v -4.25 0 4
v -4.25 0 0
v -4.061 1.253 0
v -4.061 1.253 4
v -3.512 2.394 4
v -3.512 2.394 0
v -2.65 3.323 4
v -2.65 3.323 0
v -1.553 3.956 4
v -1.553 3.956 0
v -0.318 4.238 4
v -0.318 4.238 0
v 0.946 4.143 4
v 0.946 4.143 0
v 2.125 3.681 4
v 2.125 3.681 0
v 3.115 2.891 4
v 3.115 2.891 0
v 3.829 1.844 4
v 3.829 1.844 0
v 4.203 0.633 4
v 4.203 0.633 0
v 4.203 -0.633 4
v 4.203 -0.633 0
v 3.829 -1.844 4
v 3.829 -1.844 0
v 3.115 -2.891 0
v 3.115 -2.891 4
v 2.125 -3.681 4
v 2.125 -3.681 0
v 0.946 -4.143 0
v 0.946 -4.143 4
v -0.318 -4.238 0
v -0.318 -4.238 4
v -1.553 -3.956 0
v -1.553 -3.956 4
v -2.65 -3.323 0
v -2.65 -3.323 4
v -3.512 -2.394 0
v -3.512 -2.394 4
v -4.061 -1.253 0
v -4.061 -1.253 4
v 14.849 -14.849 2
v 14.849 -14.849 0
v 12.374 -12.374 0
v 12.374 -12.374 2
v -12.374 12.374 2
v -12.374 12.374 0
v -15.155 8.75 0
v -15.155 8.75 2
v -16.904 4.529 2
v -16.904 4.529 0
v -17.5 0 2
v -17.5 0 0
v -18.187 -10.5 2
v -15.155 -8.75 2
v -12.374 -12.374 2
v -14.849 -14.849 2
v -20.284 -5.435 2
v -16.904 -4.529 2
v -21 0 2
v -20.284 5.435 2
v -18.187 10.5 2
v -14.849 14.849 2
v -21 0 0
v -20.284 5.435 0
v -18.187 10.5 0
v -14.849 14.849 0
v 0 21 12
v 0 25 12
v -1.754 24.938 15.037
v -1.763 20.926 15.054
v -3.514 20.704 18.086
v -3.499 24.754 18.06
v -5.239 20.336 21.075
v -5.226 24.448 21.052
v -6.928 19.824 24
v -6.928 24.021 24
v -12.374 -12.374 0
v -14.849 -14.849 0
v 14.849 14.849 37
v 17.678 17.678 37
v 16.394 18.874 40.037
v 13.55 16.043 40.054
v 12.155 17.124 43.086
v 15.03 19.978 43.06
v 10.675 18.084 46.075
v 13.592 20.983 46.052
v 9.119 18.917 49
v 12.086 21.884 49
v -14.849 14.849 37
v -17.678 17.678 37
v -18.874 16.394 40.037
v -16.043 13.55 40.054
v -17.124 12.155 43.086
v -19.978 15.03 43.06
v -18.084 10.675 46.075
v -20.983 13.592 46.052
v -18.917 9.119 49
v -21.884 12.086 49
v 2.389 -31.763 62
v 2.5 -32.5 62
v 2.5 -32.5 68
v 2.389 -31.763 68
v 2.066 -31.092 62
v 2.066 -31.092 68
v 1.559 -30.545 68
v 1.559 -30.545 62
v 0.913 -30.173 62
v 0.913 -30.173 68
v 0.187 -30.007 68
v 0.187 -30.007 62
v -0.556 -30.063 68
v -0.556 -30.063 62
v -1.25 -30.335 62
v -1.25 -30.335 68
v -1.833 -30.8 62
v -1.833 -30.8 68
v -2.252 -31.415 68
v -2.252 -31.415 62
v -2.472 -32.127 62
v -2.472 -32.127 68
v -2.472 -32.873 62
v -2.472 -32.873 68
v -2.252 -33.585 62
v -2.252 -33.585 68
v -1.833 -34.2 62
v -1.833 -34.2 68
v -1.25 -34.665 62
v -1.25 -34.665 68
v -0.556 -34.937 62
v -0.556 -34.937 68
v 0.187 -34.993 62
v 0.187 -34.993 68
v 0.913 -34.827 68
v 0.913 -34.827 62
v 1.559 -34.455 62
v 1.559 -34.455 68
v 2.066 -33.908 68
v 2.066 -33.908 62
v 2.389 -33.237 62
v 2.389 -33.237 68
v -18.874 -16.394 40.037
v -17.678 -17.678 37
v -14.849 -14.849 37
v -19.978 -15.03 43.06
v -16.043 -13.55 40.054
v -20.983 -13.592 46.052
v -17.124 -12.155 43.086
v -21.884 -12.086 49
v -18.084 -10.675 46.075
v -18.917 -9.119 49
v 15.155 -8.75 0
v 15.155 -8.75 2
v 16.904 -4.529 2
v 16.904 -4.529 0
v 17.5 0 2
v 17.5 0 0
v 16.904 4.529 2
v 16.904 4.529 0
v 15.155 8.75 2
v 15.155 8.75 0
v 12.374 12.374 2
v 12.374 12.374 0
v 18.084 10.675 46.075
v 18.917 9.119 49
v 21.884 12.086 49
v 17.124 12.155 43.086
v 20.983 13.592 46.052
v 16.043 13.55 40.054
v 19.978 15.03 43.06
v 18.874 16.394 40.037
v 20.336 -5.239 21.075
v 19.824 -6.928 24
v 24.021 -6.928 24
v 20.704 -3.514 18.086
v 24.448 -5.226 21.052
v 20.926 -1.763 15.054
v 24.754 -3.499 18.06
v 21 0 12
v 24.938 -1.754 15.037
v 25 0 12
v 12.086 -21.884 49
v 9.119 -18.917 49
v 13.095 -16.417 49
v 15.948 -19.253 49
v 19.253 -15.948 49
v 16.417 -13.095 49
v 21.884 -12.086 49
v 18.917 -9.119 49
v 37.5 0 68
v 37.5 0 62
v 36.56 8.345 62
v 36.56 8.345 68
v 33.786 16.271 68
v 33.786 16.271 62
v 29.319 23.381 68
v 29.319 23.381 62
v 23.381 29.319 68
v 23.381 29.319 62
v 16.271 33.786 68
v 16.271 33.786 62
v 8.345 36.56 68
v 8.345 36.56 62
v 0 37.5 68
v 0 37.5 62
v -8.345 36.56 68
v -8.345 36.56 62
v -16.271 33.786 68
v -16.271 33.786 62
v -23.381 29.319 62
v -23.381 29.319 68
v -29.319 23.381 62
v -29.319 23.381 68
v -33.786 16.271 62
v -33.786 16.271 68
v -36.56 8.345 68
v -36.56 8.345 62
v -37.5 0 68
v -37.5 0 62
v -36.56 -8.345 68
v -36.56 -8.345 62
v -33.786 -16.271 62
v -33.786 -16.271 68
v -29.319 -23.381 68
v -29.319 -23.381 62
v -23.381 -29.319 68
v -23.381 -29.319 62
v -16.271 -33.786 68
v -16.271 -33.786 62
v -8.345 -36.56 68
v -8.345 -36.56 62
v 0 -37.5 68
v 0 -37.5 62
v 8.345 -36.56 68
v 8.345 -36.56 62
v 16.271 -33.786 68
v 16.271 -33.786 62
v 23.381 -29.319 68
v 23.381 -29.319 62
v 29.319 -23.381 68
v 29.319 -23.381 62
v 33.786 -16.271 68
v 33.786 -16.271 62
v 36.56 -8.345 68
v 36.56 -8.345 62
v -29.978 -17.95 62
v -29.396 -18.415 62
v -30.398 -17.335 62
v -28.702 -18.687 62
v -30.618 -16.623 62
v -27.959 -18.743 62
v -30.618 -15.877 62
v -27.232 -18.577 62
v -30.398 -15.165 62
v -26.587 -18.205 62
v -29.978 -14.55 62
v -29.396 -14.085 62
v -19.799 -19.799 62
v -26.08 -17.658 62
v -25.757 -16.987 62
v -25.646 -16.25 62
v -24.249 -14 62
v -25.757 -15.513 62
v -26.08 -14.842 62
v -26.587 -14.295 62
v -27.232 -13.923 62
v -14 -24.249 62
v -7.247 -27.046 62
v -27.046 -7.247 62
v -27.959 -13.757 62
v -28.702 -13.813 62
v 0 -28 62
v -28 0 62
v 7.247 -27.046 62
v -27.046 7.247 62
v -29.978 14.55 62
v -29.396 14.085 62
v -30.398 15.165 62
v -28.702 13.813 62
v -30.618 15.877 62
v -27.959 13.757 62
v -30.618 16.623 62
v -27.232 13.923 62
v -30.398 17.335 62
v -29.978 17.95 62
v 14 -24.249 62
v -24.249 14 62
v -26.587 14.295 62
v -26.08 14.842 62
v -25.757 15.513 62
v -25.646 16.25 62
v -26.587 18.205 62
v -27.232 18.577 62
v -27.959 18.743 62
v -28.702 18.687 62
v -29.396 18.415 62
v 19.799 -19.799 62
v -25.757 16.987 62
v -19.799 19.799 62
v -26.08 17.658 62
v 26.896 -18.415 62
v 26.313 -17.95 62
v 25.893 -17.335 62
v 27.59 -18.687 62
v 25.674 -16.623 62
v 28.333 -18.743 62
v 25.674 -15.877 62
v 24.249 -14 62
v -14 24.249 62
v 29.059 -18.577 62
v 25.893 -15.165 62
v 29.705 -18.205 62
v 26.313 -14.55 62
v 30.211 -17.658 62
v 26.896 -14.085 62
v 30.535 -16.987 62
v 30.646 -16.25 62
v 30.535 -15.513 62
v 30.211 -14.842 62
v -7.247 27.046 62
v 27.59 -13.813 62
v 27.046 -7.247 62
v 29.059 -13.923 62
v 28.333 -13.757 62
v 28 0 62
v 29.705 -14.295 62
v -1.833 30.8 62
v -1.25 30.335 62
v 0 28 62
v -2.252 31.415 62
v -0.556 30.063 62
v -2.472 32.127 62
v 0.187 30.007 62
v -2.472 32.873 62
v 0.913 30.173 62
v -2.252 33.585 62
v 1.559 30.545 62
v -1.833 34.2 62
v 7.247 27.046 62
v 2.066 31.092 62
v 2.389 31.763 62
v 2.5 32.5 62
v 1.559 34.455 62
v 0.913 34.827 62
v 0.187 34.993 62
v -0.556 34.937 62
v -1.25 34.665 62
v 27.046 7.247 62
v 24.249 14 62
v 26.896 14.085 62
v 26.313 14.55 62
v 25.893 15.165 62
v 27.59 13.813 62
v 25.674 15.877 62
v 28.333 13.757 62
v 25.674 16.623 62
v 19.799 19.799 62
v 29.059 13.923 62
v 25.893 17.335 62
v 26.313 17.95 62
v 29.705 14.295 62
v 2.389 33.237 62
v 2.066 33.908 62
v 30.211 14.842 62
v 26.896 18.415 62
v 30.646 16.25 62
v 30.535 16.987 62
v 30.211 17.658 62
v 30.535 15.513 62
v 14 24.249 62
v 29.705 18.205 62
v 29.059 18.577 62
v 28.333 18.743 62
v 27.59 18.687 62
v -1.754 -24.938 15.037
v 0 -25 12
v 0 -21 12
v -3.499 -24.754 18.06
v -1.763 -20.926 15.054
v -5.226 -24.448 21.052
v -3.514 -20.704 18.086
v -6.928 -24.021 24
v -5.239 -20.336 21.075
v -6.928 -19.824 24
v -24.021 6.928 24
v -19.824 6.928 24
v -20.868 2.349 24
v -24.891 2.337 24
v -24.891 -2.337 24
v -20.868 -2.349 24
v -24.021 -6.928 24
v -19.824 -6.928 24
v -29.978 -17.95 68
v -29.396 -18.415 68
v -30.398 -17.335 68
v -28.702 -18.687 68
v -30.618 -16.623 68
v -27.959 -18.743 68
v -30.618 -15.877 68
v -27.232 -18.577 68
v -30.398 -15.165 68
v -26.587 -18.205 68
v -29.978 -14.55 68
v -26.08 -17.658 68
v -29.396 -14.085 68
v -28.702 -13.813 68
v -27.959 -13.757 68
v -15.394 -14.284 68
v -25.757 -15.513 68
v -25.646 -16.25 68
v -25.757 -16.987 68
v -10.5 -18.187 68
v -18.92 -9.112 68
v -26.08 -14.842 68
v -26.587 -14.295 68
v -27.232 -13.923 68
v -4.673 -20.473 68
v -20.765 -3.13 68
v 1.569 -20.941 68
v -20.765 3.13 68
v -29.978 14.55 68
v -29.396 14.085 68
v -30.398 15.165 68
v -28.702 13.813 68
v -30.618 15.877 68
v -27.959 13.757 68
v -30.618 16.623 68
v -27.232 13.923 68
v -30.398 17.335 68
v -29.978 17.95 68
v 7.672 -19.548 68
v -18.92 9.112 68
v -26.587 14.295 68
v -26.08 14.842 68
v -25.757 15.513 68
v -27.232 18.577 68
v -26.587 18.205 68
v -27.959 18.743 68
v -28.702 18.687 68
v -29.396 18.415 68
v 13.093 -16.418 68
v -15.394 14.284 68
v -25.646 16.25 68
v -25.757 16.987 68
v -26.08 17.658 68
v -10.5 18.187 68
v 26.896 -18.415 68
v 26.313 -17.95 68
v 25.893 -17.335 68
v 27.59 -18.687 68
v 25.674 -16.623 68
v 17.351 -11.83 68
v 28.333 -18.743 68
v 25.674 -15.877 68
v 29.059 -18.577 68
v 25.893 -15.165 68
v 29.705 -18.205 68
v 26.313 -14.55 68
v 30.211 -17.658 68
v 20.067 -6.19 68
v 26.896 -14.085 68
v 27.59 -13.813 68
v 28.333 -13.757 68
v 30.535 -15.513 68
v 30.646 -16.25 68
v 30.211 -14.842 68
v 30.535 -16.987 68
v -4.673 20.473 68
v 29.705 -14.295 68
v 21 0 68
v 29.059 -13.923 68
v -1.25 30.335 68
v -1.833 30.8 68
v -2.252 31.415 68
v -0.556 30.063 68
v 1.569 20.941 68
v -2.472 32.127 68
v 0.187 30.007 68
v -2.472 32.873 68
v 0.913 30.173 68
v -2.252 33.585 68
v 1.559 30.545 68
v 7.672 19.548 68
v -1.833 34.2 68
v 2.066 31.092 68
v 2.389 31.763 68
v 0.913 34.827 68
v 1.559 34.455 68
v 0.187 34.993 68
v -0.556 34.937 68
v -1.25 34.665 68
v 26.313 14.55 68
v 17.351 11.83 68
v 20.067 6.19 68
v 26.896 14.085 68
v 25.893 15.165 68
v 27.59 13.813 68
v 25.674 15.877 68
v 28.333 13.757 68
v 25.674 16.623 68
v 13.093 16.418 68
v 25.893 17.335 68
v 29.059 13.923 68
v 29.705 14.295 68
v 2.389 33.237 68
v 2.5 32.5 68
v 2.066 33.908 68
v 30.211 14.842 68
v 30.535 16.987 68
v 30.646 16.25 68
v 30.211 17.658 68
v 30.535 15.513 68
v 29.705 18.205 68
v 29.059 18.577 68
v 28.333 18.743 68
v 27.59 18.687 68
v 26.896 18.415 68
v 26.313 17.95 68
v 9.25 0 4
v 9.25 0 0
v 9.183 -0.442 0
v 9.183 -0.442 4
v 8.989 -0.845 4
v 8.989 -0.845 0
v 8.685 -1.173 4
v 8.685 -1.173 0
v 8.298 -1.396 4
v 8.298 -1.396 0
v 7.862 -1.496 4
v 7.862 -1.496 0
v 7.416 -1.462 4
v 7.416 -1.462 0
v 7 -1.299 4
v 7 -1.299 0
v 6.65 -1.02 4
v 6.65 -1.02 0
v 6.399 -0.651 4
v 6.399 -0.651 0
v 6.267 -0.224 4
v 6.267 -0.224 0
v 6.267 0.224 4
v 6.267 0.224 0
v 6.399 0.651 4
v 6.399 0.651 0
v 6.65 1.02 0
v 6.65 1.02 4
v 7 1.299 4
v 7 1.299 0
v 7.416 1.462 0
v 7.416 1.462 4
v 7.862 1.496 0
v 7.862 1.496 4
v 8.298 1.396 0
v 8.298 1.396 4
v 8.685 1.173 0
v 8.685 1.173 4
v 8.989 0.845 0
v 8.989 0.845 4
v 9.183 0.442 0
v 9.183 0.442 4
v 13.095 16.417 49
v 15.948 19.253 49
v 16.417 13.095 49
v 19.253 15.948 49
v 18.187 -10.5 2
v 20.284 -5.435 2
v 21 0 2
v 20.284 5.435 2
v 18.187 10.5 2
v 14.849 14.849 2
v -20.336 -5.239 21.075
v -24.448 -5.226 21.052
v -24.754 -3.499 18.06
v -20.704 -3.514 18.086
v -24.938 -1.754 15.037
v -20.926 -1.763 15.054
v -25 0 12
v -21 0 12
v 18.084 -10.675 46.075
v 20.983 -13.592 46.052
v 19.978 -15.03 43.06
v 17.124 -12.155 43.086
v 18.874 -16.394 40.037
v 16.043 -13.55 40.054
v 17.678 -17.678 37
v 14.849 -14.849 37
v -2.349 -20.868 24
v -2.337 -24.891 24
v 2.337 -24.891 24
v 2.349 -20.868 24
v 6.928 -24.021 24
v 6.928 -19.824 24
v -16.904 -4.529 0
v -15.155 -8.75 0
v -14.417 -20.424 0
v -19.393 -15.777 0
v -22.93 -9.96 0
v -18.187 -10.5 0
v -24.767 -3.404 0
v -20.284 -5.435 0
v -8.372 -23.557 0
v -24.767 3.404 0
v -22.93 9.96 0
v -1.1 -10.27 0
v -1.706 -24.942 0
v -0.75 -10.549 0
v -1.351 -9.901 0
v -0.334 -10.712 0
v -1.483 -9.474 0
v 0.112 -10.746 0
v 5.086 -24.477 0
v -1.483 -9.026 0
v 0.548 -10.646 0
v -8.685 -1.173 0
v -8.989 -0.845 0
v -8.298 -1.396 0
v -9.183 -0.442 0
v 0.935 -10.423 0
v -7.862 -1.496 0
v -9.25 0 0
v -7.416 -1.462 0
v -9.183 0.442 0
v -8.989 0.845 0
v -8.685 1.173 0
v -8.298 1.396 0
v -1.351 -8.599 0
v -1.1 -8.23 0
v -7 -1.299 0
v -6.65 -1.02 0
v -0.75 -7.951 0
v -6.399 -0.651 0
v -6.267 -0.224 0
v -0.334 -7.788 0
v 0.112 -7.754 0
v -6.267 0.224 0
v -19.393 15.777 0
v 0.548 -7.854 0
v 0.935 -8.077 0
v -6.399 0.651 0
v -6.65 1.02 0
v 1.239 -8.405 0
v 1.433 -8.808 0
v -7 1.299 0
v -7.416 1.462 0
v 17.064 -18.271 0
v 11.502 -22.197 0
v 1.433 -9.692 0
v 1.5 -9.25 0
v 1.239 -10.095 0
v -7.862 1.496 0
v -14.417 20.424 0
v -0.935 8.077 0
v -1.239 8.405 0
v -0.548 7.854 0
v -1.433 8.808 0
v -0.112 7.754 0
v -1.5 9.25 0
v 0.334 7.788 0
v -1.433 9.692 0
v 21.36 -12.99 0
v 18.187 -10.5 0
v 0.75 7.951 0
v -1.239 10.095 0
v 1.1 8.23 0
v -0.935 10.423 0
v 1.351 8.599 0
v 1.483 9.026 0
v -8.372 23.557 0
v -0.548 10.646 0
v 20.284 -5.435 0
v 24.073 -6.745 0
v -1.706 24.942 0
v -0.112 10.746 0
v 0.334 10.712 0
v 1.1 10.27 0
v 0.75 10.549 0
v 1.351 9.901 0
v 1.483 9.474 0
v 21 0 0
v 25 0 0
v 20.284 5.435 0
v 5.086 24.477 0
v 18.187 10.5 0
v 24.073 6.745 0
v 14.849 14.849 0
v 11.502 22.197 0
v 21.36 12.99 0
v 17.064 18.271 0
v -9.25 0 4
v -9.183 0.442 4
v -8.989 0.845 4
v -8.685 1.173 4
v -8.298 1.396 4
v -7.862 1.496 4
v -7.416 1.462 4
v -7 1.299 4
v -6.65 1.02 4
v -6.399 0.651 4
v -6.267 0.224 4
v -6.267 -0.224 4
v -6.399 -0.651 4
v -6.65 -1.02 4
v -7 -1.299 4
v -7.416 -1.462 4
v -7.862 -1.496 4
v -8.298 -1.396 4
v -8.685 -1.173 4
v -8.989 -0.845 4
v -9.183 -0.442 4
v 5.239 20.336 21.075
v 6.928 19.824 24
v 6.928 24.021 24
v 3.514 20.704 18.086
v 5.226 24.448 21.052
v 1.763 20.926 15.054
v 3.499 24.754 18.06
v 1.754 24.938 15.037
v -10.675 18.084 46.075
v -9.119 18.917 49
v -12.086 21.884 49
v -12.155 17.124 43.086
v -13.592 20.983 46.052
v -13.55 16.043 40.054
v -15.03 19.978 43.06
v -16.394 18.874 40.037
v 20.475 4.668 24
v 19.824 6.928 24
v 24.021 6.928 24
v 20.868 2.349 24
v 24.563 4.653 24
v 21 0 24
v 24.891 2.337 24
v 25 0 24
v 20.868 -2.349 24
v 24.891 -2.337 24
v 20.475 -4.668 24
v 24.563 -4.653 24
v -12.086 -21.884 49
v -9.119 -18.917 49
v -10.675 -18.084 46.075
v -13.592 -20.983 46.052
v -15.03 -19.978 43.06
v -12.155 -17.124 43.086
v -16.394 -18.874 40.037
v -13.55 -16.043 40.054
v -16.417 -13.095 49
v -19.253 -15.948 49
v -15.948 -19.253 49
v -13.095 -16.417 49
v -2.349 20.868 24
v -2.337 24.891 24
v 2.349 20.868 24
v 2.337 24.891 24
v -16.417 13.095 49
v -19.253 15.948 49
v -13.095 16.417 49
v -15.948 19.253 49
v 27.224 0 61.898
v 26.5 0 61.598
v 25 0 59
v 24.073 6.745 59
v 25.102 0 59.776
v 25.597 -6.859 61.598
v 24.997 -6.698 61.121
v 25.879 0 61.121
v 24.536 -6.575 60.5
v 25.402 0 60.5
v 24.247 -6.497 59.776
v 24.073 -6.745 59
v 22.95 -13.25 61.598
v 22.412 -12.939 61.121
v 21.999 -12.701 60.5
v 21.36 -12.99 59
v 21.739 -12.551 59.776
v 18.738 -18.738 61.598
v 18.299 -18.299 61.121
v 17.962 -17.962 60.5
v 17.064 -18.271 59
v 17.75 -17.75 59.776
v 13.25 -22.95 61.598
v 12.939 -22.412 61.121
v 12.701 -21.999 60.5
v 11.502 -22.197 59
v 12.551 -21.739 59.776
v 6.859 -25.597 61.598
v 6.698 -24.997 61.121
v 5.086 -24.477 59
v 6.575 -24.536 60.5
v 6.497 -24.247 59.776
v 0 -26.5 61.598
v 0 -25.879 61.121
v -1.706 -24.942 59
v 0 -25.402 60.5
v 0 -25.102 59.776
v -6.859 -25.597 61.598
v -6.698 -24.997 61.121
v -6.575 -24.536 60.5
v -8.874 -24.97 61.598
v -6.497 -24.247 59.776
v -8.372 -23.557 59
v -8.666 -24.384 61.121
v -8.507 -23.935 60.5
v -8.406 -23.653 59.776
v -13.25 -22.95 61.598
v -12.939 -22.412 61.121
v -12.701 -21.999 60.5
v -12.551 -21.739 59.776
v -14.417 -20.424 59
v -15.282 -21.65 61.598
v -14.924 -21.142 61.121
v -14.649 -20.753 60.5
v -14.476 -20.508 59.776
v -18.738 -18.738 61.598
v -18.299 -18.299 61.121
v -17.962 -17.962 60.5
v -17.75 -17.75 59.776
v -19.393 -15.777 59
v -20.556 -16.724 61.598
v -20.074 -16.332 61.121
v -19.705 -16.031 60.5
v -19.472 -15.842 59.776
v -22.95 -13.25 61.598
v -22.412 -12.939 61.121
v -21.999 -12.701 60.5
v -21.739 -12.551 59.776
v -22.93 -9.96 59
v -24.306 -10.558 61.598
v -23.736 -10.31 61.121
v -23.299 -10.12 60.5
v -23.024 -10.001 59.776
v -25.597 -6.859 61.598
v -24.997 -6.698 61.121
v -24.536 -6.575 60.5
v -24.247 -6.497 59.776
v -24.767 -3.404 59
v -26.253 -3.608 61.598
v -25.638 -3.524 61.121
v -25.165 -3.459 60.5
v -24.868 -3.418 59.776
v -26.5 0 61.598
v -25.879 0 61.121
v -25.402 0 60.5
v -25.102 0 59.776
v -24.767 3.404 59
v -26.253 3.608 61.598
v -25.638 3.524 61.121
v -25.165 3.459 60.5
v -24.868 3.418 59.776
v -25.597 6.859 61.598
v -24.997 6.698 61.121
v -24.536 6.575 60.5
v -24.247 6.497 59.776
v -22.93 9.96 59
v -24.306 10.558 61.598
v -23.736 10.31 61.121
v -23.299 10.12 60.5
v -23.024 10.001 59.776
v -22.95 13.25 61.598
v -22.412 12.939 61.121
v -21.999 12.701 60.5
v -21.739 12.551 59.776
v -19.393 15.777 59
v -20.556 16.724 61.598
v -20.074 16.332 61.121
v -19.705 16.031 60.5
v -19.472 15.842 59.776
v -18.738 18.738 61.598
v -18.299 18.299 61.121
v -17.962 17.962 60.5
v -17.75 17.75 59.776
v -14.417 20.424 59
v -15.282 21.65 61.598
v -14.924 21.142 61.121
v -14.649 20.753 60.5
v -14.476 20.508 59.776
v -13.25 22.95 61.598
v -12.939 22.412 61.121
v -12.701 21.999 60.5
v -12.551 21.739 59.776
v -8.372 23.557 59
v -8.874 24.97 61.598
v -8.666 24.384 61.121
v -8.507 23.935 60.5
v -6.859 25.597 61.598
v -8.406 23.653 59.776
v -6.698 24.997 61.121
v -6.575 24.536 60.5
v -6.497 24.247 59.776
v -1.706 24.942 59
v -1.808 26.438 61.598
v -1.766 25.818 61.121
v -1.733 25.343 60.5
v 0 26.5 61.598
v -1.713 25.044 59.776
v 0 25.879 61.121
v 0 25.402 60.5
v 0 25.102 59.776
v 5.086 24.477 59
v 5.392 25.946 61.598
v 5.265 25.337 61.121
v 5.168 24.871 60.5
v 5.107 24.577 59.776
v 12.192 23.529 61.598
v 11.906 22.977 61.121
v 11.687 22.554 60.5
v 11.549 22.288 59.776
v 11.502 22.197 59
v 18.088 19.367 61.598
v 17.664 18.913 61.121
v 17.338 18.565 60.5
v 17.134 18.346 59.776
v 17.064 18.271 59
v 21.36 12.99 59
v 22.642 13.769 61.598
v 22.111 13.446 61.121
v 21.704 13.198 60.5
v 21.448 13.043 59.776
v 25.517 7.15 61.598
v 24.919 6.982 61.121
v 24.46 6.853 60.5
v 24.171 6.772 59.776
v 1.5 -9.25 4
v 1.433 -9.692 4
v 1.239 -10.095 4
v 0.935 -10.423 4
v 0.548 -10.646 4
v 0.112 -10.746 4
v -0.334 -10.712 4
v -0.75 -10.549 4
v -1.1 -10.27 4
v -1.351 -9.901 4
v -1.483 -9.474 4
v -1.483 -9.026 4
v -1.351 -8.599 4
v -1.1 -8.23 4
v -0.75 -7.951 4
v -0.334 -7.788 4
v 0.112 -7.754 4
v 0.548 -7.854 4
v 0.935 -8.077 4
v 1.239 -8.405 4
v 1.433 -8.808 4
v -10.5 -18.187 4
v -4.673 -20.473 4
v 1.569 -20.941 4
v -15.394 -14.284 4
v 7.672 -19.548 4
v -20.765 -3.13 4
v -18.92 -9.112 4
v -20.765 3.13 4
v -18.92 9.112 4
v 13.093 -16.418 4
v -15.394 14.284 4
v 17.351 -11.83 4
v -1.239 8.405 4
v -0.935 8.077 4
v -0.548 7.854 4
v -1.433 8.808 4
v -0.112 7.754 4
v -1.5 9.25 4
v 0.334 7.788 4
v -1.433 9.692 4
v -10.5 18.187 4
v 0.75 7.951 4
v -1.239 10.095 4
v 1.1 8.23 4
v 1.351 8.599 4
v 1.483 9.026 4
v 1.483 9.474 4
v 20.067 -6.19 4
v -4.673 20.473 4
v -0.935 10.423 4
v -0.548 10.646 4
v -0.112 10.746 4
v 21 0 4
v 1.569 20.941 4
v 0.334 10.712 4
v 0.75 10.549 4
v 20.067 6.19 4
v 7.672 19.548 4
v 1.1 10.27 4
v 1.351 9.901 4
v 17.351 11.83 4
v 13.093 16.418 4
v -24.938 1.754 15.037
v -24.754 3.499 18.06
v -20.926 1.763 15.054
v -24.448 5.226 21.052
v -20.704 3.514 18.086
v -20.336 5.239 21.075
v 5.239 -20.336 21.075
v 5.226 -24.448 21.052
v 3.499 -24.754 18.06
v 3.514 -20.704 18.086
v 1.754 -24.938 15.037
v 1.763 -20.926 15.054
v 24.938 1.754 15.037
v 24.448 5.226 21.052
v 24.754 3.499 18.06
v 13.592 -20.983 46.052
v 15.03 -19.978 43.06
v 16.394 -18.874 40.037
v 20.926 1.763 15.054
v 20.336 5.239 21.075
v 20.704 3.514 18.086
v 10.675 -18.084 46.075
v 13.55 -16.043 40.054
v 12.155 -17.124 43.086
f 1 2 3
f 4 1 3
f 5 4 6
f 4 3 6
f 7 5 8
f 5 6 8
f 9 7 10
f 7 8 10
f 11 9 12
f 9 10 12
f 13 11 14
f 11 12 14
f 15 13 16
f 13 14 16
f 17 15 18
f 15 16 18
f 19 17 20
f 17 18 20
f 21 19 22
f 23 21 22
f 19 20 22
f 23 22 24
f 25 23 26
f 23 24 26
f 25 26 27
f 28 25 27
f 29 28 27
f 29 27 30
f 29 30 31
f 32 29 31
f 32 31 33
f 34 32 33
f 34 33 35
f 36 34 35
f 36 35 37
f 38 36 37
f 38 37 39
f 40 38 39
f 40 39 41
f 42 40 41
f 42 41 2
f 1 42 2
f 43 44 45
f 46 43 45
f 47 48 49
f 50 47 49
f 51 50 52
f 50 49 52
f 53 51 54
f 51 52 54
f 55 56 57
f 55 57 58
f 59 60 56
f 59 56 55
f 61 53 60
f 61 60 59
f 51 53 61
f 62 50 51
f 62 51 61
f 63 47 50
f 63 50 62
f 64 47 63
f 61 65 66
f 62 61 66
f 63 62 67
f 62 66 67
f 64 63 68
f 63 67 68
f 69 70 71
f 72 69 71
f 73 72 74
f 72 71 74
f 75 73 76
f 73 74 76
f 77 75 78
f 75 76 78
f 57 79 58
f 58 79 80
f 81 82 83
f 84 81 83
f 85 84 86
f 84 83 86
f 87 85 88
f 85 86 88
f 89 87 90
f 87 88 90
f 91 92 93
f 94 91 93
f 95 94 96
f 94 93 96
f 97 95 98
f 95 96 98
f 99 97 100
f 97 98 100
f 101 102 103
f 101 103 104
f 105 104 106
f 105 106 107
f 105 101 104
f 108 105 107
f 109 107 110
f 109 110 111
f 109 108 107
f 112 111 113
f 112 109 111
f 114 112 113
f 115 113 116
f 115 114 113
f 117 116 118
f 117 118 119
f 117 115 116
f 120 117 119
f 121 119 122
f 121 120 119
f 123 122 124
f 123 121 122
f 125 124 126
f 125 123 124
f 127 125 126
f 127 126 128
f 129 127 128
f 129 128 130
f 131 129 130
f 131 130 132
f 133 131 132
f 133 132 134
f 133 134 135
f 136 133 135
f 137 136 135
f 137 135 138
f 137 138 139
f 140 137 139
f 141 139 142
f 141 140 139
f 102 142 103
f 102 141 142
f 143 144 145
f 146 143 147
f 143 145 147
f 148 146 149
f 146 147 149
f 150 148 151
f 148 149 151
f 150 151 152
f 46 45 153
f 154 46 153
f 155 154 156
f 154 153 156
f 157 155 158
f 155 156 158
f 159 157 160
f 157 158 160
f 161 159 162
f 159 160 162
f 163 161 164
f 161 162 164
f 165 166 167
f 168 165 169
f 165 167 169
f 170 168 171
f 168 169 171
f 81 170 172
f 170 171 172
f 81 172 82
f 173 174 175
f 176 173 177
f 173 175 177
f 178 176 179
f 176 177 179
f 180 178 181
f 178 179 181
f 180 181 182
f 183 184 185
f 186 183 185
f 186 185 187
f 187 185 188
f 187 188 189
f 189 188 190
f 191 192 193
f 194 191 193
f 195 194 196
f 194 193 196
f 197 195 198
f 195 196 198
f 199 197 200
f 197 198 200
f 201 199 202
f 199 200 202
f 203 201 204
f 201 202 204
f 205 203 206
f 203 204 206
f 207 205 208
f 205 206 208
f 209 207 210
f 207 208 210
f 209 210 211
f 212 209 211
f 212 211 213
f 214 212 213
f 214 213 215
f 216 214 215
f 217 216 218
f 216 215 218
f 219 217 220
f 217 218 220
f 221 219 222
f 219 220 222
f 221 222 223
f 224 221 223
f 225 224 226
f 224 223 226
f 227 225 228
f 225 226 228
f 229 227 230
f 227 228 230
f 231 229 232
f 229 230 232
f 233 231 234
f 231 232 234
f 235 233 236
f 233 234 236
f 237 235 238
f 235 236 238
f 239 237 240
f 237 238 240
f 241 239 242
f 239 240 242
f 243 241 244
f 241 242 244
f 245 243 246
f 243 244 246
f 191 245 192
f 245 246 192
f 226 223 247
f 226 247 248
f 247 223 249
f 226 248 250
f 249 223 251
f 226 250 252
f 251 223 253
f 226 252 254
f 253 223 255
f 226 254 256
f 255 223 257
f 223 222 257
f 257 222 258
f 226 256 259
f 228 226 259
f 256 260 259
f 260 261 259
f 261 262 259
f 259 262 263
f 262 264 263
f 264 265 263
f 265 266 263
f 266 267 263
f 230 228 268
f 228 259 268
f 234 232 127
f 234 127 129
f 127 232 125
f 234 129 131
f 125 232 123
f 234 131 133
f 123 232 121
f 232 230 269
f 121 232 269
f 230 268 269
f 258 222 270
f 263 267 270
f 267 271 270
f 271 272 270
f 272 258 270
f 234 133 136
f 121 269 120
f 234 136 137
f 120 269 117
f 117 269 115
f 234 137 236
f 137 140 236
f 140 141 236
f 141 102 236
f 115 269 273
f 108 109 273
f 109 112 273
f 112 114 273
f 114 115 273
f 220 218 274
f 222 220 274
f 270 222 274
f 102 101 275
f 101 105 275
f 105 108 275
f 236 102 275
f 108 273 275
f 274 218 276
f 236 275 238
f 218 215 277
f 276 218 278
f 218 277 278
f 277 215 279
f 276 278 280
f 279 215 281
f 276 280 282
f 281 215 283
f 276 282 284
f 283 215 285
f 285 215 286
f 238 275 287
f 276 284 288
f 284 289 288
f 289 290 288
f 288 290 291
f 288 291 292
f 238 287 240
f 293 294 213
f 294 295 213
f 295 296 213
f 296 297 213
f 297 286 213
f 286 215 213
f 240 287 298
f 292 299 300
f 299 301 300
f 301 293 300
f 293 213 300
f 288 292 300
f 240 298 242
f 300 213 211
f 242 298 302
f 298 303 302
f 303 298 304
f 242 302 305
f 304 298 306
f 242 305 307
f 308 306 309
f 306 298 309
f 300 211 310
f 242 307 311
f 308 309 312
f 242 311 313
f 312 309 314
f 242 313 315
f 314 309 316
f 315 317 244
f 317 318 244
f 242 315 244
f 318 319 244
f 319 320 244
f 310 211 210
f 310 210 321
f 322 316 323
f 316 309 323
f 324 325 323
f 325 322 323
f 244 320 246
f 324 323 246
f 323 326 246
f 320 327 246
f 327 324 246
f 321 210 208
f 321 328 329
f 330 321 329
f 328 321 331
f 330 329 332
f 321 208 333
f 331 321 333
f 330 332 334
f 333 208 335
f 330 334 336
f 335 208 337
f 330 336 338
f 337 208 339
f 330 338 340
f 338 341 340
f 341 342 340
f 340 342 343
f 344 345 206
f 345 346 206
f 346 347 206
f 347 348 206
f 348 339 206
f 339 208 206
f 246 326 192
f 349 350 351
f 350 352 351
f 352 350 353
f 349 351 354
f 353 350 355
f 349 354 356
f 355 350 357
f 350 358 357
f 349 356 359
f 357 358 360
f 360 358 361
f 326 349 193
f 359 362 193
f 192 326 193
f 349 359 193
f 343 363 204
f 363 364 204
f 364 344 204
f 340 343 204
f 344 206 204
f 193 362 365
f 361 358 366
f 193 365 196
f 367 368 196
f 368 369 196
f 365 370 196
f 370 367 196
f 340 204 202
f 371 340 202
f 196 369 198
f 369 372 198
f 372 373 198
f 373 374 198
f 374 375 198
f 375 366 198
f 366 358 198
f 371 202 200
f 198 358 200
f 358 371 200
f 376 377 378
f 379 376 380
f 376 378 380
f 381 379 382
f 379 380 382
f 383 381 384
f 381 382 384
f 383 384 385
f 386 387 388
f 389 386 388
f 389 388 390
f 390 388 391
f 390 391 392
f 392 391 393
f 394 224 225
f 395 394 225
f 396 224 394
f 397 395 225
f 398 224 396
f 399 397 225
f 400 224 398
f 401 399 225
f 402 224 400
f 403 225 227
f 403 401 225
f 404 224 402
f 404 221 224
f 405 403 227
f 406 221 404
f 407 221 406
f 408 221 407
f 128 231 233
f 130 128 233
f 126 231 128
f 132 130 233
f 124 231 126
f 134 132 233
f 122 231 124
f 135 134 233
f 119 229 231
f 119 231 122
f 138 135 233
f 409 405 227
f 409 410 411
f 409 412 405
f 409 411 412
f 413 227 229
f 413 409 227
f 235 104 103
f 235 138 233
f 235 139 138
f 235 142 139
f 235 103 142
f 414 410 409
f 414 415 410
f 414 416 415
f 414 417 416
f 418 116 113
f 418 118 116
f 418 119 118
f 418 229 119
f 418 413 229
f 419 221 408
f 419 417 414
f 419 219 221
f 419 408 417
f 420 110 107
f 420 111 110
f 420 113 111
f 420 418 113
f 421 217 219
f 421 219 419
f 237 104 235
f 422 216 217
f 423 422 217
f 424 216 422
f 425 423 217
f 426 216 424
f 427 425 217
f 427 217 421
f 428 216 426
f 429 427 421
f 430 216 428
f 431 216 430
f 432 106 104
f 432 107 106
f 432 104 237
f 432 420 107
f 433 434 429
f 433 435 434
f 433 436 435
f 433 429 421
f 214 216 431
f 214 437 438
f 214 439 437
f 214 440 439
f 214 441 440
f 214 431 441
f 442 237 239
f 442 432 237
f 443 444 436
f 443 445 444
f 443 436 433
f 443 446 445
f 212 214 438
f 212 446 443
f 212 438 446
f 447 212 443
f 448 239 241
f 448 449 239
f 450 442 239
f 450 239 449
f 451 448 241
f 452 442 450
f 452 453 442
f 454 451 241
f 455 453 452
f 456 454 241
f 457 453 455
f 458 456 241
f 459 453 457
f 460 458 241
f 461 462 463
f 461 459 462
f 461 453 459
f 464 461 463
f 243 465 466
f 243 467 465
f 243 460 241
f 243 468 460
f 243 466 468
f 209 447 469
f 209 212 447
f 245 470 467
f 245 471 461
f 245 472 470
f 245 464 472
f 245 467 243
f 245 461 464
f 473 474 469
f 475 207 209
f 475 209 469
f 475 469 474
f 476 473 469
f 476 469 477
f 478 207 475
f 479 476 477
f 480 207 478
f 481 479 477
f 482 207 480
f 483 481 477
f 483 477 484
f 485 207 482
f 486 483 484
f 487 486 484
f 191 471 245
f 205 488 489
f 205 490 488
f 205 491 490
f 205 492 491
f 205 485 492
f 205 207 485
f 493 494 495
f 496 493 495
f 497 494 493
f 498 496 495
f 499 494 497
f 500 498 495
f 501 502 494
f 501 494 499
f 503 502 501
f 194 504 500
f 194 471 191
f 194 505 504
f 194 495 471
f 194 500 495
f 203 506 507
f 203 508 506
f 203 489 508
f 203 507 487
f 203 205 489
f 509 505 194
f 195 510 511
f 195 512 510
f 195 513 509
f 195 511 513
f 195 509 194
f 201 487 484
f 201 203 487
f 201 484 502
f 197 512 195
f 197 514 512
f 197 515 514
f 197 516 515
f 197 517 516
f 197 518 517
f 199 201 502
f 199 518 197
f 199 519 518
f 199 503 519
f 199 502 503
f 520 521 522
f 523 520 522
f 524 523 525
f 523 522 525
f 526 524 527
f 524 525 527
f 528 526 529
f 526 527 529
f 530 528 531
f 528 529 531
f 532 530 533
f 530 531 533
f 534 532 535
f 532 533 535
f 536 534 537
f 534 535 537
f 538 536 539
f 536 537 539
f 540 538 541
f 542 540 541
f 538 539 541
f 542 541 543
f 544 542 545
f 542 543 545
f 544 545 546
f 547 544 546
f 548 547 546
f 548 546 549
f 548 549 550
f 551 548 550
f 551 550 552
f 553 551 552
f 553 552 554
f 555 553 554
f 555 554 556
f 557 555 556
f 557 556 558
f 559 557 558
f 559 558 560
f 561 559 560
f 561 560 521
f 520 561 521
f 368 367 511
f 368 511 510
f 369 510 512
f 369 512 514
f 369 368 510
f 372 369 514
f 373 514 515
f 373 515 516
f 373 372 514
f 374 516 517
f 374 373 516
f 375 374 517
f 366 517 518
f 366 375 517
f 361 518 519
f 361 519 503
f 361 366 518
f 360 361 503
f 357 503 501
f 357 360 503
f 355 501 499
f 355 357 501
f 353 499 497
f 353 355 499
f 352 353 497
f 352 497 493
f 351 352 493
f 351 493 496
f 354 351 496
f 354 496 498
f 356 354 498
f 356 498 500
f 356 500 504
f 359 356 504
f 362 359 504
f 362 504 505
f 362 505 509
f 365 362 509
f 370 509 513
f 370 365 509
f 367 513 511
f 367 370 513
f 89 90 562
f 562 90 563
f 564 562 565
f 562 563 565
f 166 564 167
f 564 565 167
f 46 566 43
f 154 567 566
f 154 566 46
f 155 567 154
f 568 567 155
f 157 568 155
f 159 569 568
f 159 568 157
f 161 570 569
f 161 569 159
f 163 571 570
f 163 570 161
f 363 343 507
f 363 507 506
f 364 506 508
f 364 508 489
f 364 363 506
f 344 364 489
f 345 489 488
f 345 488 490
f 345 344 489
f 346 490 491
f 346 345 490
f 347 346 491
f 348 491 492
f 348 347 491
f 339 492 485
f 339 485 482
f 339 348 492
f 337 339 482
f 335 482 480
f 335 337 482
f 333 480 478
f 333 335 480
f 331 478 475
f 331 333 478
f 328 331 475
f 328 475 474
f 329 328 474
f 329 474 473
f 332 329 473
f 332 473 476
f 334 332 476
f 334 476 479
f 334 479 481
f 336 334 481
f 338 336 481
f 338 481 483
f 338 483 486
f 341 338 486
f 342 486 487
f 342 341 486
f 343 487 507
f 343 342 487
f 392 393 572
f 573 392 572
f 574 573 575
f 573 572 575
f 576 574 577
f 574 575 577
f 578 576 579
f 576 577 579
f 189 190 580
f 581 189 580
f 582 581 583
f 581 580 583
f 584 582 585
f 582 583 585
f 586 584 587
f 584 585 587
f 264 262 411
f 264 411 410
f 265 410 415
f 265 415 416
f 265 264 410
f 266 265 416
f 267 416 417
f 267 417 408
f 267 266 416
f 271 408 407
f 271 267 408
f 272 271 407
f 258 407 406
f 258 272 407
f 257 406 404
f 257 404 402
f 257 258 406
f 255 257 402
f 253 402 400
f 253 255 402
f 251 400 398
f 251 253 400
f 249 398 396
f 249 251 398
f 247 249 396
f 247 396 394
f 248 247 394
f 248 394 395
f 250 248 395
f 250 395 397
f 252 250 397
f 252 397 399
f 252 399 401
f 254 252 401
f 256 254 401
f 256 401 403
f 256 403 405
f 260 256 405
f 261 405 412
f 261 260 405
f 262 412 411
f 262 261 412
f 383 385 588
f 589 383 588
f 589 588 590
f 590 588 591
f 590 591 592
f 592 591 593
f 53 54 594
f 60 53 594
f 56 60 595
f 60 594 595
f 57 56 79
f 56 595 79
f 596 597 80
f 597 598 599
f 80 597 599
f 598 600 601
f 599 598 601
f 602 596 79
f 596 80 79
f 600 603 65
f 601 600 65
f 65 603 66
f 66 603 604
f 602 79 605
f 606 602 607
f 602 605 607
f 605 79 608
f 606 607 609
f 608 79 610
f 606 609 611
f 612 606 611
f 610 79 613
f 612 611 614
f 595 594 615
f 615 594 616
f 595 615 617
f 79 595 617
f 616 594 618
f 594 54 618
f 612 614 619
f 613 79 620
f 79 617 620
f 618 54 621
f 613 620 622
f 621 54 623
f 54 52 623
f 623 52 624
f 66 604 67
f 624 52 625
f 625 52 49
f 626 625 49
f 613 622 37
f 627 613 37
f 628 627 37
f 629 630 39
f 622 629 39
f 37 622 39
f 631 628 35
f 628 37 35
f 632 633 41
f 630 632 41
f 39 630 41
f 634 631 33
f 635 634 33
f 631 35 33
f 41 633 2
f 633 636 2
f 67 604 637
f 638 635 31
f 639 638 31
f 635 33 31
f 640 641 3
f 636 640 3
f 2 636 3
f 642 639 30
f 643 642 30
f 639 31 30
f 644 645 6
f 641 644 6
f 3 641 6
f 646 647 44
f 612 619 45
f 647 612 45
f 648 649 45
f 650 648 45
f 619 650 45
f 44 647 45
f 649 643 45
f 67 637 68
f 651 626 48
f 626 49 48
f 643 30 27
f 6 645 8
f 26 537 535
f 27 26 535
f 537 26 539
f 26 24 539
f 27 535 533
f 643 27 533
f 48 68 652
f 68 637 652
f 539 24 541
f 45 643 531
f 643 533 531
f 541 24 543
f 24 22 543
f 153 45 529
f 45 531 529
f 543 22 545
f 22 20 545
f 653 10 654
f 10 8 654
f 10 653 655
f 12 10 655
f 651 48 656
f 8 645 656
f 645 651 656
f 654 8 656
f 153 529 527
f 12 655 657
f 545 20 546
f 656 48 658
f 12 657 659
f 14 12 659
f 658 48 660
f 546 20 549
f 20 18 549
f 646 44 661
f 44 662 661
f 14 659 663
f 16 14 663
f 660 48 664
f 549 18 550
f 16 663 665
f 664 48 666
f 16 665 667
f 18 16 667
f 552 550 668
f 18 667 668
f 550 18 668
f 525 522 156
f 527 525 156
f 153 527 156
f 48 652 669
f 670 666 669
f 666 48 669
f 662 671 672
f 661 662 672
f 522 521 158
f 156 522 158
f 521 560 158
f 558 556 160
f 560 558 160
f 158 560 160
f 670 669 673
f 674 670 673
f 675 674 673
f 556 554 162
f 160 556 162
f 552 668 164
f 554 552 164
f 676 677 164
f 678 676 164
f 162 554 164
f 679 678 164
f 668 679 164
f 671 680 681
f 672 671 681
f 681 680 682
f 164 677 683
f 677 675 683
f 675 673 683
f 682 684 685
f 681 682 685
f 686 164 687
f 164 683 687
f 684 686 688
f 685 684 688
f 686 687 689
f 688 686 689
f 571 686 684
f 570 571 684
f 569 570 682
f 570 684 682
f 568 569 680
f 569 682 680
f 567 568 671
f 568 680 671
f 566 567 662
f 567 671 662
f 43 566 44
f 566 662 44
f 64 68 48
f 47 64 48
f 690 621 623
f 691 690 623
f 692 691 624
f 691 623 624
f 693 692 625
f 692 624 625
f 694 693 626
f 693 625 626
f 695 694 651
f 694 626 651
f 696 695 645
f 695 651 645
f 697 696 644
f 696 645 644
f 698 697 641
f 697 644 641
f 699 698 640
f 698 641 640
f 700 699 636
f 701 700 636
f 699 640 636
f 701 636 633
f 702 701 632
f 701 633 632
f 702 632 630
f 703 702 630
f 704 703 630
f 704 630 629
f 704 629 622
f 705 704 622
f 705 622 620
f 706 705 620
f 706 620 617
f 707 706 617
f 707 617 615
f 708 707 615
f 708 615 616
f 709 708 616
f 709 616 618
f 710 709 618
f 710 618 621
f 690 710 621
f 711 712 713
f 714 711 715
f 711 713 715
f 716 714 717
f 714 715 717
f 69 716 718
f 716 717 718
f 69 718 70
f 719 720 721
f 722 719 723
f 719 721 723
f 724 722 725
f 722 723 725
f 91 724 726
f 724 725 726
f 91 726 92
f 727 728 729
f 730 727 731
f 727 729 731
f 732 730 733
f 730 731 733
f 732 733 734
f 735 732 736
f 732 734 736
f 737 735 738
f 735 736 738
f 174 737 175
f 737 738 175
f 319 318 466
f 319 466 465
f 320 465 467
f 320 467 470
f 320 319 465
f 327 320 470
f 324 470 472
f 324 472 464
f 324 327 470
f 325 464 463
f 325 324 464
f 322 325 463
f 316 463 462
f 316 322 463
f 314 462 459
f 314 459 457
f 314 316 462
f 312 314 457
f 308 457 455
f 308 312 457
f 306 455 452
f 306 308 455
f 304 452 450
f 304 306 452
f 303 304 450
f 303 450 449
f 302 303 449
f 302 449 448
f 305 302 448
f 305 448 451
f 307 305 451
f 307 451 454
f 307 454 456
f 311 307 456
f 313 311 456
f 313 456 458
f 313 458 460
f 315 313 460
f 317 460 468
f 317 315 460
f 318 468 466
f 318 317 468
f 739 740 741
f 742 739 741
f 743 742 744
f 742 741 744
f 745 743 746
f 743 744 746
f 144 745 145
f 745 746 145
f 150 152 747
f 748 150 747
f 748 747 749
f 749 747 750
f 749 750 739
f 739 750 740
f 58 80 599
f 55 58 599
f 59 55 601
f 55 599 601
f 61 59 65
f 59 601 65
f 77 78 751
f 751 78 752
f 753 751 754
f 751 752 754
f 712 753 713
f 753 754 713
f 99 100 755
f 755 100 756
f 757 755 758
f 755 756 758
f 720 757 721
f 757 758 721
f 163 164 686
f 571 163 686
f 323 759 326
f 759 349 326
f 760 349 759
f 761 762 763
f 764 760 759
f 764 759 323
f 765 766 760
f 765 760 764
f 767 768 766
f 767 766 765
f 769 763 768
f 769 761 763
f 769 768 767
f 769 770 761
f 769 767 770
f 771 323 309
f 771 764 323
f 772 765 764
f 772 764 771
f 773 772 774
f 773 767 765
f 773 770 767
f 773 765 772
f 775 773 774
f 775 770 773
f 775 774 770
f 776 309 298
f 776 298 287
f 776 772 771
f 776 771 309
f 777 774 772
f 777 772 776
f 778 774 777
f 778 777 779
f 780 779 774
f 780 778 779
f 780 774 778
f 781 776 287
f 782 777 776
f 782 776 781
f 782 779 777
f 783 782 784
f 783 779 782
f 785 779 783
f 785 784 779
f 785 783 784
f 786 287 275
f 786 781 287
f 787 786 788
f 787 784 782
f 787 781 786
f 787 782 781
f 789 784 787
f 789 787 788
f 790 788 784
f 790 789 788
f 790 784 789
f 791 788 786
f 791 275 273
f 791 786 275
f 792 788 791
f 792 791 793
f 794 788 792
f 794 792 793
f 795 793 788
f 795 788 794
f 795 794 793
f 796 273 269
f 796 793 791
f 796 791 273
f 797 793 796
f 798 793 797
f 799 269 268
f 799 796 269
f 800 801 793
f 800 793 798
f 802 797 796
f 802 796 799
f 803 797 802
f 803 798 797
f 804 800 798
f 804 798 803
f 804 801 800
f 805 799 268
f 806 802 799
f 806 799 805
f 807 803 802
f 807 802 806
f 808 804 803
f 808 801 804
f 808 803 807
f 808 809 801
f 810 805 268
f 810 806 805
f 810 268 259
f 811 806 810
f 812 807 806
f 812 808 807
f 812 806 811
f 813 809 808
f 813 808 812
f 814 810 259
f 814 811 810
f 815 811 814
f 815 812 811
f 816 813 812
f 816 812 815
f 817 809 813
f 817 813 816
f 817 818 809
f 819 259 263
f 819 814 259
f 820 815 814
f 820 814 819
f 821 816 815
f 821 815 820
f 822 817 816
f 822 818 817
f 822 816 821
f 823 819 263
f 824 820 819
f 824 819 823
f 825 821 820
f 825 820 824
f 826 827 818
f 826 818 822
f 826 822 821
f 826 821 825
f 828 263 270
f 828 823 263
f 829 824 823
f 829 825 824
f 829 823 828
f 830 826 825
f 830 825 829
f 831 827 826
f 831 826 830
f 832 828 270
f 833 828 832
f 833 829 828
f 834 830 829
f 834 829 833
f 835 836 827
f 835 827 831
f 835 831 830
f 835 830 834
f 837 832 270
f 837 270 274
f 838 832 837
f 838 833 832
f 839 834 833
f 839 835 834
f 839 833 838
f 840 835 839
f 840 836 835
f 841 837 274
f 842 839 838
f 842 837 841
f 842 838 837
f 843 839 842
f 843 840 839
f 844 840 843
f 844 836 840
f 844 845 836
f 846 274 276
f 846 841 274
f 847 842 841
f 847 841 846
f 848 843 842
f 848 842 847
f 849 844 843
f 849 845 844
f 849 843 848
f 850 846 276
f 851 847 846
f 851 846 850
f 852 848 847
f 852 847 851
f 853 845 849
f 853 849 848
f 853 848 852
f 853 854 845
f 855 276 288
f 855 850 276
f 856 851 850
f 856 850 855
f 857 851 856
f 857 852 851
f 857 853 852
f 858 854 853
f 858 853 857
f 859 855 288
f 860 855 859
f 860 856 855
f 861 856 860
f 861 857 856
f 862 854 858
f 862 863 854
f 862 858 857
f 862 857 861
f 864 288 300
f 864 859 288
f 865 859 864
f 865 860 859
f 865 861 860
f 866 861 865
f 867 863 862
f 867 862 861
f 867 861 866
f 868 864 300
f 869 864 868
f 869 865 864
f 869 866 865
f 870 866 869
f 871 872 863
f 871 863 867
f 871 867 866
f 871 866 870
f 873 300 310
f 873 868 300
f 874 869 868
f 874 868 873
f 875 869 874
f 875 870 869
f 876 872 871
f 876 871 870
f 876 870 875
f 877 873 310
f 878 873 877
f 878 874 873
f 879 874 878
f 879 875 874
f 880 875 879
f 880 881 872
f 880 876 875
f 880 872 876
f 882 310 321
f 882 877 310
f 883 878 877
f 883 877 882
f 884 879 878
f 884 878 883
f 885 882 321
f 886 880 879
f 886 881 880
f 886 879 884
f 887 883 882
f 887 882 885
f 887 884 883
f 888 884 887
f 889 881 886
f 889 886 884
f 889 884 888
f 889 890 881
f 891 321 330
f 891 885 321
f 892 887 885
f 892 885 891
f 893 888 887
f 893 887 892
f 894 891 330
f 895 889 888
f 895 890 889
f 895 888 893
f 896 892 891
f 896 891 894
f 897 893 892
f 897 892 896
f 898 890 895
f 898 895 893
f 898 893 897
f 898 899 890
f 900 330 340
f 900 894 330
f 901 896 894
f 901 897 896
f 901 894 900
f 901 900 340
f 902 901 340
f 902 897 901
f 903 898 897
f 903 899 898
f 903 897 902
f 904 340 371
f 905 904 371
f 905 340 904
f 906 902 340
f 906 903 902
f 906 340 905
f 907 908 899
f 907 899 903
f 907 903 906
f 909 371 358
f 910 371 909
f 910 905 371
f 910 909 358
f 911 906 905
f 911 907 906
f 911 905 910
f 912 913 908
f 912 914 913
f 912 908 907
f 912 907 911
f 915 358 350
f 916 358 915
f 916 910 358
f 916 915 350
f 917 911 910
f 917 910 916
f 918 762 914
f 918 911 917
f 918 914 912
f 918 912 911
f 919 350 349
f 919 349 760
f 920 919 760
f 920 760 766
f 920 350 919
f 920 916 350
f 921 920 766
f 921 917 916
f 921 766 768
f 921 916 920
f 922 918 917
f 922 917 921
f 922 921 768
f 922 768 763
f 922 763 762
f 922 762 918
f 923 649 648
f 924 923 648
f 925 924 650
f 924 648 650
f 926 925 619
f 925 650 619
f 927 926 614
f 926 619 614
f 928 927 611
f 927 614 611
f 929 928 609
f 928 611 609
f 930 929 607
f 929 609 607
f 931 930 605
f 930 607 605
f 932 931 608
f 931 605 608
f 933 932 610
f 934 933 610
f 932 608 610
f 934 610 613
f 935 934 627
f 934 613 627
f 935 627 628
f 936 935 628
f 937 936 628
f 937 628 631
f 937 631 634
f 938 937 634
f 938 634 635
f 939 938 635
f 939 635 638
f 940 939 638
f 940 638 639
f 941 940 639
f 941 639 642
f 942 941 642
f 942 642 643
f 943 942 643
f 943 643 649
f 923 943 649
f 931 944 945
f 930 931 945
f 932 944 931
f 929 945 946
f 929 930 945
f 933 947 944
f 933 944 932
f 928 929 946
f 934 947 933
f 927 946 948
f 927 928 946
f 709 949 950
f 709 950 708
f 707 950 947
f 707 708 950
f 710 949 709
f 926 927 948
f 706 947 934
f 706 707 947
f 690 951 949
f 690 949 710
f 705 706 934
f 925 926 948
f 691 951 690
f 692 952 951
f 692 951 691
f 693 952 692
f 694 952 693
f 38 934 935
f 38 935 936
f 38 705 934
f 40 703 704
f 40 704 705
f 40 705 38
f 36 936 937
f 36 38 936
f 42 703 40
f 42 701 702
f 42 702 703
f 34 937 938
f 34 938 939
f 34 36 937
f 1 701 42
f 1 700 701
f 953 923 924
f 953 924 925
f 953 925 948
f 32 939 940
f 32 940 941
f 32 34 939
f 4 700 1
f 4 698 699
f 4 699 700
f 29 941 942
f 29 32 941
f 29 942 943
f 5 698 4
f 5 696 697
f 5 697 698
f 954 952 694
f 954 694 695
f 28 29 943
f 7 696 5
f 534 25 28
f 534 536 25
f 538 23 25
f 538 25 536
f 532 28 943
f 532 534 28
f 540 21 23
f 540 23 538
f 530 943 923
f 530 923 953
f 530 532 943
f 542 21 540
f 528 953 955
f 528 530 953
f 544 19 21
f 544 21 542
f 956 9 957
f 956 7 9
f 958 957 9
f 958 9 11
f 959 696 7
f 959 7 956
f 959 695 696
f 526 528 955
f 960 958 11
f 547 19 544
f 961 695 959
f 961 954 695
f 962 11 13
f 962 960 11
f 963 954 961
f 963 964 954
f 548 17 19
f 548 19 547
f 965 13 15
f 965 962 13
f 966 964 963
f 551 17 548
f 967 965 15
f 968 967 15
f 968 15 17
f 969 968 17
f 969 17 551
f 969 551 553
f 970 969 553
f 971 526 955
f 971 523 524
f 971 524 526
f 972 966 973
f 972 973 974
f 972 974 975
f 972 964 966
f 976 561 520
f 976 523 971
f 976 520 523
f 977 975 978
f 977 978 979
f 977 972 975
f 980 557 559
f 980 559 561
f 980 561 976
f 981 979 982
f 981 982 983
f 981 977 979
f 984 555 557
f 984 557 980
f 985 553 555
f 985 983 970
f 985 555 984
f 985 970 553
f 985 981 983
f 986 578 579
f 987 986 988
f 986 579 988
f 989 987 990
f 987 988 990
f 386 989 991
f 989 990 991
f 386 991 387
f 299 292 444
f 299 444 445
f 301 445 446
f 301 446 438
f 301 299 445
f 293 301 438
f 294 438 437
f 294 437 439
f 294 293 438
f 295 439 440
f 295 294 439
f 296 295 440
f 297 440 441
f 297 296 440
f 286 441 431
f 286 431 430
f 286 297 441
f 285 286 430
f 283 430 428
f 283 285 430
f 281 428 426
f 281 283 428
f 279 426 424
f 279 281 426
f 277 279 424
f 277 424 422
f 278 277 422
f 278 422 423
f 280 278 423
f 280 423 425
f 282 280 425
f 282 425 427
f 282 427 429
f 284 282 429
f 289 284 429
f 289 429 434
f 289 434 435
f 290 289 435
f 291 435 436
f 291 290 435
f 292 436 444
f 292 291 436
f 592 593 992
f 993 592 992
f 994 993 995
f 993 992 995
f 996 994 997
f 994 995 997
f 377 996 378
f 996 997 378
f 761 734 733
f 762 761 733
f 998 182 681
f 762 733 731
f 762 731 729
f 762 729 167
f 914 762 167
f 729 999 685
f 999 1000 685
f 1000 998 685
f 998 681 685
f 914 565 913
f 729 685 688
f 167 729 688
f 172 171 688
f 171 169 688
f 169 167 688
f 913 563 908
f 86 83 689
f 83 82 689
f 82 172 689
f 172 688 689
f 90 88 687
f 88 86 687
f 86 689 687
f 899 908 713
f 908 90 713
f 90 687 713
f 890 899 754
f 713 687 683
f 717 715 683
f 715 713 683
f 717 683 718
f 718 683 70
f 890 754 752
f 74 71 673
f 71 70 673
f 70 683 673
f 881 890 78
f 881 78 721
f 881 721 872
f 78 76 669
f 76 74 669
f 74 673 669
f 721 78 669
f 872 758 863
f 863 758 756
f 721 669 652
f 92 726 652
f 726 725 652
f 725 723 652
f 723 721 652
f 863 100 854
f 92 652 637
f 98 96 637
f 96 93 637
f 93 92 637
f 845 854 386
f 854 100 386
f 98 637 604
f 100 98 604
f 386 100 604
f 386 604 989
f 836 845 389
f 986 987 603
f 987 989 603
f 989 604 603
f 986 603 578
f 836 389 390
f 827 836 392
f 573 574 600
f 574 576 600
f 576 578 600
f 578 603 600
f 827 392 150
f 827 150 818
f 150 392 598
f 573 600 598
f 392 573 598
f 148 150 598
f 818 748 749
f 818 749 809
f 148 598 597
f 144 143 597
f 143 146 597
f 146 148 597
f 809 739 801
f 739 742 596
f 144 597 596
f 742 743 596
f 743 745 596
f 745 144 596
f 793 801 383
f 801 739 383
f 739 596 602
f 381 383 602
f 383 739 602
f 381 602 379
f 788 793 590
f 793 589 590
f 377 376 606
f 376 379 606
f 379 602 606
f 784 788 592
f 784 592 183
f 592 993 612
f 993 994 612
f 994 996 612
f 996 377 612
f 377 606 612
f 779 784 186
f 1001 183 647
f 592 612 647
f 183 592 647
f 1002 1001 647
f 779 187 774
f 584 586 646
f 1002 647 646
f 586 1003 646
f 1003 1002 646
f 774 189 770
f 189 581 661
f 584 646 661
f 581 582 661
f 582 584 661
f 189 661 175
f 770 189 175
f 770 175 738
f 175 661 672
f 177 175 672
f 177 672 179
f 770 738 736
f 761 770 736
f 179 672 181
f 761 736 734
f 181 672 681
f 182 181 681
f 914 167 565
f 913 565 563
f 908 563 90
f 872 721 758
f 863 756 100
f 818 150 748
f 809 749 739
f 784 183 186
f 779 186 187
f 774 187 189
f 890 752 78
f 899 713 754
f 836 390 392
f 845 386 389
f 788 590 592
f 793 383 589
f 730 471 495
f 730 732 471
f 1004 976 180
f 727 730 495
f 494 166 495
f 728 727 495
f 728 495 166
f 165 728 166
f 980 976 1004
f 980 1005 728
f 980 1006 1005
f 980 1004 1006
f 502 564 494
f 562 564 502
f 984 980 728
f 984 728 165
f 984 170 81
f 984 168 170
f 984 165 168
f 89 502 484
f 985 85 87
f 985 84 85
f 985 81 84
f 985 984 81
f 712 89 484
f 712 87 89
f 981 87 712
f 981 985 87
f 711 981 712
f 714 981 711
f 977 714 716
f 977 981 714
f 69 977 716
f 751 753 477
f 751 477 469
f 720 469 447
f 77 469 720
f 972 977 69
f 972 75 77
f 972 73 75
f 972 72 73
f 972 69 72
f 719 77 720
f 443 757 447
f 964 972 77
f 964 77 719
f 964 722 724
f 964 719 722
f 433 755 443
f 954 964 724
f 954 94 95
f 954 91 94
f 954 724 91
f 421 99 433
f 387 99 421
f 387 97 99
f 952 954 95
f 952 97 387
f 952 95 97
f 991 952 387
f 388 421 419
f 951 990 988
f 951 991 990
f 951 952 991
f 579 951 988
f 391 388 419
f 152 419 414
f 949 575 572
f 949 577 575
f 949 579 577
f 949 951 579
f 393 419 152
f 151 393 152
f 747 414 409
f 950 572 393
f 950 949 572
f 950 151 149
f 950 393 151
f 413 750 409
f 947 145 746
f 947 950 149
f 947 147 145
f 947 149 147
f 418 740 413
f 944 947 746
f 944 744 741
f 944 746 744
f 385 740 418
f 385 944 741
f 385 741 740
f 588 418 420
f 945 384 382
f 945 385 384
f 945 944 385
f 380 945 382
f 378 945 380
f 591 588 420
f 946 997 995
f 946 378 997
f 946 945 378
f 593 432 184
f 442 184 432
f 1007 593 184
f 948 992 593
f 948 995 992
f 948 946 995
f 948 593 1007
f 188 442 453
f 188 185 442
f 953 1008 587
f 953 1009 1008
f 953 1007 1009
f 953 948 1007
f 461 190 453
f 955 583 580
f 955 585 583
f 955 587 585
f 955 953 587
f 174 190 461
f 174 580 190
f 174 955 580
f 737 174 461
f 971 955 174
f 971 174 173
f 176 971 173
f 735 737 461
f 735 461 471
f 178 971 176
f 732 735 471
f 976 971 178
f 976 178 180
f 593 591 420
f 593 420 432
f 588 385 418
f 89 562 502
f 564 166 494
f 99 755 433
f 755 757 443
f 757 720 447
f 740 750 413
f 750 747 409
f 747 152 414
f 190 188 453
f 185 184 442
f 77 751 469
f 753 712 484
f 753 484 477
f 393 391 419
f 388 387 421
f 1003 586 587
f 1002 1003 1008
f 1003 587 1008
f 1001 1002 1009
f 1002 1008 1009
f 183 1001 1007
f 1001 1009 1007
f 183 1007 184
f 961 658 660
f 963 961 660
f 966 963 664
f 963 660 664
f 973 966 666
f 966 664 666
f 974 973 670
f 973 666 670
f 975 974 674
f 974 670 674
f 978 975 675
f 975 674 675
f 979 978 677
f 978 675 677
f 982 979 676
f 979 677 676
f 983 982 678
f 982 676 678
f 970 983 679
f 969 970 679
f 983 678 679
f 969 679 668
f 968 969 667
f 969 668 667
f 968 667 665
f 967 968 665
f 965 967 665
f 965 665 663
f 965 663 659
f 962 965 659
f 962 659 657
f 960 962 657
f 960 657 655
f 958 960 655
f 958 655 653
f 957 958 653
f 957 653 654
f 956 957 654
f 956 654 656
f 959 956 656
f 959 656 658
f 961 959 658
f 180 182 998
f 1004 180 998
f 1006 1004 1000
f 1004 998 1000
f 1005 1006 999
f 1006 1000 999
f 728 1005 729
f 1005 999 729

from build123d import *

# Parameters (mm, degrees)
SKETCH_1_R               = 25
EXTRUDE_1_DEPTH          = 4
SKETCH_2_R               = 25
SKETCH_2_R_2             = 21
EXTRUDE_2_DEPTH          = 64
EXTRUDE_START            = -6
SKETCH_3_R               = 37.5
SKETCH_3_R_2             = 21
SKETCH_3_R_3             = 2.5
EXTRUDE_3_DEPTH          = 6
FILLET_1_R               = 3
SKETCH_4_R               = 4.25
SKETCH_4_R_2             = 1.5
CUT_EXTRUDE_1_DEPTH      = 5
CUT_EXTRUDE_2_DEPTH      = 50
PATTERN_CIRCULAR_2_COUNT = 4
CUT_EXTRUDE_3_DEPTH      = 100
PATTERN_CIRCULAR_3_COUNT = 4
CUT_EXTRUDE_4_DEPTH      = 2


with BuildPart() as part:
    # 草图1 → 凸台-拉伸1 (new body)
    with BuildSketch(Plane.XY):
        Circle(SKETCH_1_R)
    extrude(amount=EXTRUDE_1_DEPTH)

    # 草图2 → 凸台-拉伸2 (add)
    with BuildSketch(Plane.XY.offset(4)):
        Circle(SKETCH_2_R)
        Circle(SKETCH_2_R_2, mode=Mode.SUBTRACT)
    extrude(amount=EXTRUDE_2_DEPTH)

    # 草图3 → 凸台-拉伸3 (add)
    with BuildSketch(Plane.XY.offset(68).offset(EXTRUDE_START)):
        Circle(SKETCH_3_R)
        Circle(SKETCH_3_R_2, mode=Mode.SUBTRACT)
        with Locations((0, 32.5)):
            Circle(SKETCH_3_R_3, mode=Mode.SUBTRACT)
        with Locations((28.145825623, 16.25)):
            Circle(SKETCH_3_R_3, mode=Mode.SUBTRACT)
        with Locations((28.145825623, -16.25)):
            Circle(SKETCH_3_R_3, mode=Mode.SUBTRACT)
        with Locations((0, -32.5)):
            Circle(SKETCH_3_R_3, mode=Mode.SUBTRACT)
        with Locations((-28.145825623, -16.25)):
            Circle(SKETCH_3_R_3, mode=Mode.SUBTRACT)
        with Locations((-28.145825623, 16.25)):
            Circle(SKETCH_3_R_3, mode=Mode.SUBTRACT)
    extrude(amount=EXTRUDE_3_DEPTH)

    # 圆角1
    fillet_1_edges = [part.edges().sort_by_distance(p)[0] for p in [
        (-25, 0, 62),
    ]]
    fillet(fillet_1_edges, radius=FILLET_1_R)

    # 草图4 → 切除-拉伸1 (cut)
    with BuildSketch(Plane(origin=(0, 0, 0), x_dir=(-1, 0, 0), z_dir=(0, 0, -1))):
        Circle(SKETCH_4_R)
        with Locations((0, 9.25)):
            Circle(SKETCH_4_R_2)
        with Locations((7.75, 0)):
            Circle(SKETCH_4_R_2)
        with Locations(Location((0, -9.25, 0), (0, 0, 180))):
            Circle(SKETCH_4_R_2)
        with Locations(Location((-7.75, 0, 0), (0, 0, 180))):
            Circle(SKETCH_4_R_2)
    extrude(amount=-CUT_EXTRUDE_1_DEPTH, mode=Mode.SUBTRACT)

    # 草图5 → 切除-拉伸2 (cut, symmetric)
    with BuildSketch(Plane(origin=(0, 0, 0), x_dir=(0, 0, -1), z_dir=(1, 0, 0))):
        Polygon((-12, 0), (-24, 6.92820323), (-24, -6.92820323), align=None)
    cut_extrude_2 = extrude(amount=CUT_EXTRUDE_2_DEPTH, both=True, mode=Mode.SUBTRACT)

    # 阵列(圆周)2: 切除-拉伸2 ×4 about axis
    pattern_circular_2_axis = Axis((0, 0, 0), (0, 0, 1))
    for i in range(1, PATTERN_CIRCULAR_2_COUNT):
        add(cut_extrude_2.rotate(pattern_circular_2_axis, i * 360 / PATTERN_CIRCULAR_2_COUNT), mode=Mode.SUBTRACT)

    # 草图7 → 切除-拉伸3 (cut)
    with BuildSketch(Plane(origin=(17.67766953, 17.67766953, 0), x_dir=(0.7071067811865487, -0.7071067811865465, 0), z_dir=(0.7071067811865465, 0.7071067811865487, 0))):
        Polygon((0, -37), (-6.92820323, -49), (6.92820323, -49), align=None)
    cut_extrude_3 = extrude(amount=-CUT_EXTRUDE_3_DEPTH, mode=Mode.SUBTRACT)

    # 阵列(圆周)3: 切除-拉伸3 ×4 about axis
    pattern_circular_3_axis = Axis((0, 0, 0), (0, 0, 1))
    for i in range(1, PATTERN_CIRCULAR_3_COUNT):
        add(cut_extrude_3.rotate(pattern_circular_3_axis, i * 360 / PATTERN_CIRCULAR_3_COUNT), mode=Mode.SUBTRACT)

    # 草图8 → 切除-拉伸4 (cut)
    with BuildSketch(Plane(origin=(0, 0, 0), x_dir=(-1, 0, 0), z_dir=(0, 0, -1))):
        with BuildLine():
            ThreePointArc((-12.374368671, -12.374368671), (-17.5, 0), (-12.374368671, 12.374368671))
            Line((-12.374368671, 12.374368671), (-14.849242405, 14.849242405))
            ThreePointArc((-14.849242405, 14.849242405), (-21, 0), (-14.849242405, -14.849242405))
            Line((-14.849242405, -14.849242405), (-12.374368671, -12.374368671))
        make_face()
        with BuildLine():
            Line((14.849242405, 14.849242405), (12.374368671, 12.374368671))
            ThreePointArc((12.374368671, 12.374368671), (16.167891819, 6.696960066), (17.5, 0))
            ThreePointArc((17.5, 0), (16.167891819, -6.696960066), (12.374368671, -12.374368671))
            Line((12.374368671, -12.374368671), (14.849242405, -14.849242405))
            ThreePointArc((14.849242405, -14.849242405), (19.401470183, -8.03635208), (21, 0))
            ThreePointArc((21, 0), (19.401470183, 8.03635208), (14.849242405, 14.849242405))
        make_face()
    extrude(amount=-CUT_EXTRUDE_4_DEPTH, mode=Mode.SUBTRACT)


solid = part.part
